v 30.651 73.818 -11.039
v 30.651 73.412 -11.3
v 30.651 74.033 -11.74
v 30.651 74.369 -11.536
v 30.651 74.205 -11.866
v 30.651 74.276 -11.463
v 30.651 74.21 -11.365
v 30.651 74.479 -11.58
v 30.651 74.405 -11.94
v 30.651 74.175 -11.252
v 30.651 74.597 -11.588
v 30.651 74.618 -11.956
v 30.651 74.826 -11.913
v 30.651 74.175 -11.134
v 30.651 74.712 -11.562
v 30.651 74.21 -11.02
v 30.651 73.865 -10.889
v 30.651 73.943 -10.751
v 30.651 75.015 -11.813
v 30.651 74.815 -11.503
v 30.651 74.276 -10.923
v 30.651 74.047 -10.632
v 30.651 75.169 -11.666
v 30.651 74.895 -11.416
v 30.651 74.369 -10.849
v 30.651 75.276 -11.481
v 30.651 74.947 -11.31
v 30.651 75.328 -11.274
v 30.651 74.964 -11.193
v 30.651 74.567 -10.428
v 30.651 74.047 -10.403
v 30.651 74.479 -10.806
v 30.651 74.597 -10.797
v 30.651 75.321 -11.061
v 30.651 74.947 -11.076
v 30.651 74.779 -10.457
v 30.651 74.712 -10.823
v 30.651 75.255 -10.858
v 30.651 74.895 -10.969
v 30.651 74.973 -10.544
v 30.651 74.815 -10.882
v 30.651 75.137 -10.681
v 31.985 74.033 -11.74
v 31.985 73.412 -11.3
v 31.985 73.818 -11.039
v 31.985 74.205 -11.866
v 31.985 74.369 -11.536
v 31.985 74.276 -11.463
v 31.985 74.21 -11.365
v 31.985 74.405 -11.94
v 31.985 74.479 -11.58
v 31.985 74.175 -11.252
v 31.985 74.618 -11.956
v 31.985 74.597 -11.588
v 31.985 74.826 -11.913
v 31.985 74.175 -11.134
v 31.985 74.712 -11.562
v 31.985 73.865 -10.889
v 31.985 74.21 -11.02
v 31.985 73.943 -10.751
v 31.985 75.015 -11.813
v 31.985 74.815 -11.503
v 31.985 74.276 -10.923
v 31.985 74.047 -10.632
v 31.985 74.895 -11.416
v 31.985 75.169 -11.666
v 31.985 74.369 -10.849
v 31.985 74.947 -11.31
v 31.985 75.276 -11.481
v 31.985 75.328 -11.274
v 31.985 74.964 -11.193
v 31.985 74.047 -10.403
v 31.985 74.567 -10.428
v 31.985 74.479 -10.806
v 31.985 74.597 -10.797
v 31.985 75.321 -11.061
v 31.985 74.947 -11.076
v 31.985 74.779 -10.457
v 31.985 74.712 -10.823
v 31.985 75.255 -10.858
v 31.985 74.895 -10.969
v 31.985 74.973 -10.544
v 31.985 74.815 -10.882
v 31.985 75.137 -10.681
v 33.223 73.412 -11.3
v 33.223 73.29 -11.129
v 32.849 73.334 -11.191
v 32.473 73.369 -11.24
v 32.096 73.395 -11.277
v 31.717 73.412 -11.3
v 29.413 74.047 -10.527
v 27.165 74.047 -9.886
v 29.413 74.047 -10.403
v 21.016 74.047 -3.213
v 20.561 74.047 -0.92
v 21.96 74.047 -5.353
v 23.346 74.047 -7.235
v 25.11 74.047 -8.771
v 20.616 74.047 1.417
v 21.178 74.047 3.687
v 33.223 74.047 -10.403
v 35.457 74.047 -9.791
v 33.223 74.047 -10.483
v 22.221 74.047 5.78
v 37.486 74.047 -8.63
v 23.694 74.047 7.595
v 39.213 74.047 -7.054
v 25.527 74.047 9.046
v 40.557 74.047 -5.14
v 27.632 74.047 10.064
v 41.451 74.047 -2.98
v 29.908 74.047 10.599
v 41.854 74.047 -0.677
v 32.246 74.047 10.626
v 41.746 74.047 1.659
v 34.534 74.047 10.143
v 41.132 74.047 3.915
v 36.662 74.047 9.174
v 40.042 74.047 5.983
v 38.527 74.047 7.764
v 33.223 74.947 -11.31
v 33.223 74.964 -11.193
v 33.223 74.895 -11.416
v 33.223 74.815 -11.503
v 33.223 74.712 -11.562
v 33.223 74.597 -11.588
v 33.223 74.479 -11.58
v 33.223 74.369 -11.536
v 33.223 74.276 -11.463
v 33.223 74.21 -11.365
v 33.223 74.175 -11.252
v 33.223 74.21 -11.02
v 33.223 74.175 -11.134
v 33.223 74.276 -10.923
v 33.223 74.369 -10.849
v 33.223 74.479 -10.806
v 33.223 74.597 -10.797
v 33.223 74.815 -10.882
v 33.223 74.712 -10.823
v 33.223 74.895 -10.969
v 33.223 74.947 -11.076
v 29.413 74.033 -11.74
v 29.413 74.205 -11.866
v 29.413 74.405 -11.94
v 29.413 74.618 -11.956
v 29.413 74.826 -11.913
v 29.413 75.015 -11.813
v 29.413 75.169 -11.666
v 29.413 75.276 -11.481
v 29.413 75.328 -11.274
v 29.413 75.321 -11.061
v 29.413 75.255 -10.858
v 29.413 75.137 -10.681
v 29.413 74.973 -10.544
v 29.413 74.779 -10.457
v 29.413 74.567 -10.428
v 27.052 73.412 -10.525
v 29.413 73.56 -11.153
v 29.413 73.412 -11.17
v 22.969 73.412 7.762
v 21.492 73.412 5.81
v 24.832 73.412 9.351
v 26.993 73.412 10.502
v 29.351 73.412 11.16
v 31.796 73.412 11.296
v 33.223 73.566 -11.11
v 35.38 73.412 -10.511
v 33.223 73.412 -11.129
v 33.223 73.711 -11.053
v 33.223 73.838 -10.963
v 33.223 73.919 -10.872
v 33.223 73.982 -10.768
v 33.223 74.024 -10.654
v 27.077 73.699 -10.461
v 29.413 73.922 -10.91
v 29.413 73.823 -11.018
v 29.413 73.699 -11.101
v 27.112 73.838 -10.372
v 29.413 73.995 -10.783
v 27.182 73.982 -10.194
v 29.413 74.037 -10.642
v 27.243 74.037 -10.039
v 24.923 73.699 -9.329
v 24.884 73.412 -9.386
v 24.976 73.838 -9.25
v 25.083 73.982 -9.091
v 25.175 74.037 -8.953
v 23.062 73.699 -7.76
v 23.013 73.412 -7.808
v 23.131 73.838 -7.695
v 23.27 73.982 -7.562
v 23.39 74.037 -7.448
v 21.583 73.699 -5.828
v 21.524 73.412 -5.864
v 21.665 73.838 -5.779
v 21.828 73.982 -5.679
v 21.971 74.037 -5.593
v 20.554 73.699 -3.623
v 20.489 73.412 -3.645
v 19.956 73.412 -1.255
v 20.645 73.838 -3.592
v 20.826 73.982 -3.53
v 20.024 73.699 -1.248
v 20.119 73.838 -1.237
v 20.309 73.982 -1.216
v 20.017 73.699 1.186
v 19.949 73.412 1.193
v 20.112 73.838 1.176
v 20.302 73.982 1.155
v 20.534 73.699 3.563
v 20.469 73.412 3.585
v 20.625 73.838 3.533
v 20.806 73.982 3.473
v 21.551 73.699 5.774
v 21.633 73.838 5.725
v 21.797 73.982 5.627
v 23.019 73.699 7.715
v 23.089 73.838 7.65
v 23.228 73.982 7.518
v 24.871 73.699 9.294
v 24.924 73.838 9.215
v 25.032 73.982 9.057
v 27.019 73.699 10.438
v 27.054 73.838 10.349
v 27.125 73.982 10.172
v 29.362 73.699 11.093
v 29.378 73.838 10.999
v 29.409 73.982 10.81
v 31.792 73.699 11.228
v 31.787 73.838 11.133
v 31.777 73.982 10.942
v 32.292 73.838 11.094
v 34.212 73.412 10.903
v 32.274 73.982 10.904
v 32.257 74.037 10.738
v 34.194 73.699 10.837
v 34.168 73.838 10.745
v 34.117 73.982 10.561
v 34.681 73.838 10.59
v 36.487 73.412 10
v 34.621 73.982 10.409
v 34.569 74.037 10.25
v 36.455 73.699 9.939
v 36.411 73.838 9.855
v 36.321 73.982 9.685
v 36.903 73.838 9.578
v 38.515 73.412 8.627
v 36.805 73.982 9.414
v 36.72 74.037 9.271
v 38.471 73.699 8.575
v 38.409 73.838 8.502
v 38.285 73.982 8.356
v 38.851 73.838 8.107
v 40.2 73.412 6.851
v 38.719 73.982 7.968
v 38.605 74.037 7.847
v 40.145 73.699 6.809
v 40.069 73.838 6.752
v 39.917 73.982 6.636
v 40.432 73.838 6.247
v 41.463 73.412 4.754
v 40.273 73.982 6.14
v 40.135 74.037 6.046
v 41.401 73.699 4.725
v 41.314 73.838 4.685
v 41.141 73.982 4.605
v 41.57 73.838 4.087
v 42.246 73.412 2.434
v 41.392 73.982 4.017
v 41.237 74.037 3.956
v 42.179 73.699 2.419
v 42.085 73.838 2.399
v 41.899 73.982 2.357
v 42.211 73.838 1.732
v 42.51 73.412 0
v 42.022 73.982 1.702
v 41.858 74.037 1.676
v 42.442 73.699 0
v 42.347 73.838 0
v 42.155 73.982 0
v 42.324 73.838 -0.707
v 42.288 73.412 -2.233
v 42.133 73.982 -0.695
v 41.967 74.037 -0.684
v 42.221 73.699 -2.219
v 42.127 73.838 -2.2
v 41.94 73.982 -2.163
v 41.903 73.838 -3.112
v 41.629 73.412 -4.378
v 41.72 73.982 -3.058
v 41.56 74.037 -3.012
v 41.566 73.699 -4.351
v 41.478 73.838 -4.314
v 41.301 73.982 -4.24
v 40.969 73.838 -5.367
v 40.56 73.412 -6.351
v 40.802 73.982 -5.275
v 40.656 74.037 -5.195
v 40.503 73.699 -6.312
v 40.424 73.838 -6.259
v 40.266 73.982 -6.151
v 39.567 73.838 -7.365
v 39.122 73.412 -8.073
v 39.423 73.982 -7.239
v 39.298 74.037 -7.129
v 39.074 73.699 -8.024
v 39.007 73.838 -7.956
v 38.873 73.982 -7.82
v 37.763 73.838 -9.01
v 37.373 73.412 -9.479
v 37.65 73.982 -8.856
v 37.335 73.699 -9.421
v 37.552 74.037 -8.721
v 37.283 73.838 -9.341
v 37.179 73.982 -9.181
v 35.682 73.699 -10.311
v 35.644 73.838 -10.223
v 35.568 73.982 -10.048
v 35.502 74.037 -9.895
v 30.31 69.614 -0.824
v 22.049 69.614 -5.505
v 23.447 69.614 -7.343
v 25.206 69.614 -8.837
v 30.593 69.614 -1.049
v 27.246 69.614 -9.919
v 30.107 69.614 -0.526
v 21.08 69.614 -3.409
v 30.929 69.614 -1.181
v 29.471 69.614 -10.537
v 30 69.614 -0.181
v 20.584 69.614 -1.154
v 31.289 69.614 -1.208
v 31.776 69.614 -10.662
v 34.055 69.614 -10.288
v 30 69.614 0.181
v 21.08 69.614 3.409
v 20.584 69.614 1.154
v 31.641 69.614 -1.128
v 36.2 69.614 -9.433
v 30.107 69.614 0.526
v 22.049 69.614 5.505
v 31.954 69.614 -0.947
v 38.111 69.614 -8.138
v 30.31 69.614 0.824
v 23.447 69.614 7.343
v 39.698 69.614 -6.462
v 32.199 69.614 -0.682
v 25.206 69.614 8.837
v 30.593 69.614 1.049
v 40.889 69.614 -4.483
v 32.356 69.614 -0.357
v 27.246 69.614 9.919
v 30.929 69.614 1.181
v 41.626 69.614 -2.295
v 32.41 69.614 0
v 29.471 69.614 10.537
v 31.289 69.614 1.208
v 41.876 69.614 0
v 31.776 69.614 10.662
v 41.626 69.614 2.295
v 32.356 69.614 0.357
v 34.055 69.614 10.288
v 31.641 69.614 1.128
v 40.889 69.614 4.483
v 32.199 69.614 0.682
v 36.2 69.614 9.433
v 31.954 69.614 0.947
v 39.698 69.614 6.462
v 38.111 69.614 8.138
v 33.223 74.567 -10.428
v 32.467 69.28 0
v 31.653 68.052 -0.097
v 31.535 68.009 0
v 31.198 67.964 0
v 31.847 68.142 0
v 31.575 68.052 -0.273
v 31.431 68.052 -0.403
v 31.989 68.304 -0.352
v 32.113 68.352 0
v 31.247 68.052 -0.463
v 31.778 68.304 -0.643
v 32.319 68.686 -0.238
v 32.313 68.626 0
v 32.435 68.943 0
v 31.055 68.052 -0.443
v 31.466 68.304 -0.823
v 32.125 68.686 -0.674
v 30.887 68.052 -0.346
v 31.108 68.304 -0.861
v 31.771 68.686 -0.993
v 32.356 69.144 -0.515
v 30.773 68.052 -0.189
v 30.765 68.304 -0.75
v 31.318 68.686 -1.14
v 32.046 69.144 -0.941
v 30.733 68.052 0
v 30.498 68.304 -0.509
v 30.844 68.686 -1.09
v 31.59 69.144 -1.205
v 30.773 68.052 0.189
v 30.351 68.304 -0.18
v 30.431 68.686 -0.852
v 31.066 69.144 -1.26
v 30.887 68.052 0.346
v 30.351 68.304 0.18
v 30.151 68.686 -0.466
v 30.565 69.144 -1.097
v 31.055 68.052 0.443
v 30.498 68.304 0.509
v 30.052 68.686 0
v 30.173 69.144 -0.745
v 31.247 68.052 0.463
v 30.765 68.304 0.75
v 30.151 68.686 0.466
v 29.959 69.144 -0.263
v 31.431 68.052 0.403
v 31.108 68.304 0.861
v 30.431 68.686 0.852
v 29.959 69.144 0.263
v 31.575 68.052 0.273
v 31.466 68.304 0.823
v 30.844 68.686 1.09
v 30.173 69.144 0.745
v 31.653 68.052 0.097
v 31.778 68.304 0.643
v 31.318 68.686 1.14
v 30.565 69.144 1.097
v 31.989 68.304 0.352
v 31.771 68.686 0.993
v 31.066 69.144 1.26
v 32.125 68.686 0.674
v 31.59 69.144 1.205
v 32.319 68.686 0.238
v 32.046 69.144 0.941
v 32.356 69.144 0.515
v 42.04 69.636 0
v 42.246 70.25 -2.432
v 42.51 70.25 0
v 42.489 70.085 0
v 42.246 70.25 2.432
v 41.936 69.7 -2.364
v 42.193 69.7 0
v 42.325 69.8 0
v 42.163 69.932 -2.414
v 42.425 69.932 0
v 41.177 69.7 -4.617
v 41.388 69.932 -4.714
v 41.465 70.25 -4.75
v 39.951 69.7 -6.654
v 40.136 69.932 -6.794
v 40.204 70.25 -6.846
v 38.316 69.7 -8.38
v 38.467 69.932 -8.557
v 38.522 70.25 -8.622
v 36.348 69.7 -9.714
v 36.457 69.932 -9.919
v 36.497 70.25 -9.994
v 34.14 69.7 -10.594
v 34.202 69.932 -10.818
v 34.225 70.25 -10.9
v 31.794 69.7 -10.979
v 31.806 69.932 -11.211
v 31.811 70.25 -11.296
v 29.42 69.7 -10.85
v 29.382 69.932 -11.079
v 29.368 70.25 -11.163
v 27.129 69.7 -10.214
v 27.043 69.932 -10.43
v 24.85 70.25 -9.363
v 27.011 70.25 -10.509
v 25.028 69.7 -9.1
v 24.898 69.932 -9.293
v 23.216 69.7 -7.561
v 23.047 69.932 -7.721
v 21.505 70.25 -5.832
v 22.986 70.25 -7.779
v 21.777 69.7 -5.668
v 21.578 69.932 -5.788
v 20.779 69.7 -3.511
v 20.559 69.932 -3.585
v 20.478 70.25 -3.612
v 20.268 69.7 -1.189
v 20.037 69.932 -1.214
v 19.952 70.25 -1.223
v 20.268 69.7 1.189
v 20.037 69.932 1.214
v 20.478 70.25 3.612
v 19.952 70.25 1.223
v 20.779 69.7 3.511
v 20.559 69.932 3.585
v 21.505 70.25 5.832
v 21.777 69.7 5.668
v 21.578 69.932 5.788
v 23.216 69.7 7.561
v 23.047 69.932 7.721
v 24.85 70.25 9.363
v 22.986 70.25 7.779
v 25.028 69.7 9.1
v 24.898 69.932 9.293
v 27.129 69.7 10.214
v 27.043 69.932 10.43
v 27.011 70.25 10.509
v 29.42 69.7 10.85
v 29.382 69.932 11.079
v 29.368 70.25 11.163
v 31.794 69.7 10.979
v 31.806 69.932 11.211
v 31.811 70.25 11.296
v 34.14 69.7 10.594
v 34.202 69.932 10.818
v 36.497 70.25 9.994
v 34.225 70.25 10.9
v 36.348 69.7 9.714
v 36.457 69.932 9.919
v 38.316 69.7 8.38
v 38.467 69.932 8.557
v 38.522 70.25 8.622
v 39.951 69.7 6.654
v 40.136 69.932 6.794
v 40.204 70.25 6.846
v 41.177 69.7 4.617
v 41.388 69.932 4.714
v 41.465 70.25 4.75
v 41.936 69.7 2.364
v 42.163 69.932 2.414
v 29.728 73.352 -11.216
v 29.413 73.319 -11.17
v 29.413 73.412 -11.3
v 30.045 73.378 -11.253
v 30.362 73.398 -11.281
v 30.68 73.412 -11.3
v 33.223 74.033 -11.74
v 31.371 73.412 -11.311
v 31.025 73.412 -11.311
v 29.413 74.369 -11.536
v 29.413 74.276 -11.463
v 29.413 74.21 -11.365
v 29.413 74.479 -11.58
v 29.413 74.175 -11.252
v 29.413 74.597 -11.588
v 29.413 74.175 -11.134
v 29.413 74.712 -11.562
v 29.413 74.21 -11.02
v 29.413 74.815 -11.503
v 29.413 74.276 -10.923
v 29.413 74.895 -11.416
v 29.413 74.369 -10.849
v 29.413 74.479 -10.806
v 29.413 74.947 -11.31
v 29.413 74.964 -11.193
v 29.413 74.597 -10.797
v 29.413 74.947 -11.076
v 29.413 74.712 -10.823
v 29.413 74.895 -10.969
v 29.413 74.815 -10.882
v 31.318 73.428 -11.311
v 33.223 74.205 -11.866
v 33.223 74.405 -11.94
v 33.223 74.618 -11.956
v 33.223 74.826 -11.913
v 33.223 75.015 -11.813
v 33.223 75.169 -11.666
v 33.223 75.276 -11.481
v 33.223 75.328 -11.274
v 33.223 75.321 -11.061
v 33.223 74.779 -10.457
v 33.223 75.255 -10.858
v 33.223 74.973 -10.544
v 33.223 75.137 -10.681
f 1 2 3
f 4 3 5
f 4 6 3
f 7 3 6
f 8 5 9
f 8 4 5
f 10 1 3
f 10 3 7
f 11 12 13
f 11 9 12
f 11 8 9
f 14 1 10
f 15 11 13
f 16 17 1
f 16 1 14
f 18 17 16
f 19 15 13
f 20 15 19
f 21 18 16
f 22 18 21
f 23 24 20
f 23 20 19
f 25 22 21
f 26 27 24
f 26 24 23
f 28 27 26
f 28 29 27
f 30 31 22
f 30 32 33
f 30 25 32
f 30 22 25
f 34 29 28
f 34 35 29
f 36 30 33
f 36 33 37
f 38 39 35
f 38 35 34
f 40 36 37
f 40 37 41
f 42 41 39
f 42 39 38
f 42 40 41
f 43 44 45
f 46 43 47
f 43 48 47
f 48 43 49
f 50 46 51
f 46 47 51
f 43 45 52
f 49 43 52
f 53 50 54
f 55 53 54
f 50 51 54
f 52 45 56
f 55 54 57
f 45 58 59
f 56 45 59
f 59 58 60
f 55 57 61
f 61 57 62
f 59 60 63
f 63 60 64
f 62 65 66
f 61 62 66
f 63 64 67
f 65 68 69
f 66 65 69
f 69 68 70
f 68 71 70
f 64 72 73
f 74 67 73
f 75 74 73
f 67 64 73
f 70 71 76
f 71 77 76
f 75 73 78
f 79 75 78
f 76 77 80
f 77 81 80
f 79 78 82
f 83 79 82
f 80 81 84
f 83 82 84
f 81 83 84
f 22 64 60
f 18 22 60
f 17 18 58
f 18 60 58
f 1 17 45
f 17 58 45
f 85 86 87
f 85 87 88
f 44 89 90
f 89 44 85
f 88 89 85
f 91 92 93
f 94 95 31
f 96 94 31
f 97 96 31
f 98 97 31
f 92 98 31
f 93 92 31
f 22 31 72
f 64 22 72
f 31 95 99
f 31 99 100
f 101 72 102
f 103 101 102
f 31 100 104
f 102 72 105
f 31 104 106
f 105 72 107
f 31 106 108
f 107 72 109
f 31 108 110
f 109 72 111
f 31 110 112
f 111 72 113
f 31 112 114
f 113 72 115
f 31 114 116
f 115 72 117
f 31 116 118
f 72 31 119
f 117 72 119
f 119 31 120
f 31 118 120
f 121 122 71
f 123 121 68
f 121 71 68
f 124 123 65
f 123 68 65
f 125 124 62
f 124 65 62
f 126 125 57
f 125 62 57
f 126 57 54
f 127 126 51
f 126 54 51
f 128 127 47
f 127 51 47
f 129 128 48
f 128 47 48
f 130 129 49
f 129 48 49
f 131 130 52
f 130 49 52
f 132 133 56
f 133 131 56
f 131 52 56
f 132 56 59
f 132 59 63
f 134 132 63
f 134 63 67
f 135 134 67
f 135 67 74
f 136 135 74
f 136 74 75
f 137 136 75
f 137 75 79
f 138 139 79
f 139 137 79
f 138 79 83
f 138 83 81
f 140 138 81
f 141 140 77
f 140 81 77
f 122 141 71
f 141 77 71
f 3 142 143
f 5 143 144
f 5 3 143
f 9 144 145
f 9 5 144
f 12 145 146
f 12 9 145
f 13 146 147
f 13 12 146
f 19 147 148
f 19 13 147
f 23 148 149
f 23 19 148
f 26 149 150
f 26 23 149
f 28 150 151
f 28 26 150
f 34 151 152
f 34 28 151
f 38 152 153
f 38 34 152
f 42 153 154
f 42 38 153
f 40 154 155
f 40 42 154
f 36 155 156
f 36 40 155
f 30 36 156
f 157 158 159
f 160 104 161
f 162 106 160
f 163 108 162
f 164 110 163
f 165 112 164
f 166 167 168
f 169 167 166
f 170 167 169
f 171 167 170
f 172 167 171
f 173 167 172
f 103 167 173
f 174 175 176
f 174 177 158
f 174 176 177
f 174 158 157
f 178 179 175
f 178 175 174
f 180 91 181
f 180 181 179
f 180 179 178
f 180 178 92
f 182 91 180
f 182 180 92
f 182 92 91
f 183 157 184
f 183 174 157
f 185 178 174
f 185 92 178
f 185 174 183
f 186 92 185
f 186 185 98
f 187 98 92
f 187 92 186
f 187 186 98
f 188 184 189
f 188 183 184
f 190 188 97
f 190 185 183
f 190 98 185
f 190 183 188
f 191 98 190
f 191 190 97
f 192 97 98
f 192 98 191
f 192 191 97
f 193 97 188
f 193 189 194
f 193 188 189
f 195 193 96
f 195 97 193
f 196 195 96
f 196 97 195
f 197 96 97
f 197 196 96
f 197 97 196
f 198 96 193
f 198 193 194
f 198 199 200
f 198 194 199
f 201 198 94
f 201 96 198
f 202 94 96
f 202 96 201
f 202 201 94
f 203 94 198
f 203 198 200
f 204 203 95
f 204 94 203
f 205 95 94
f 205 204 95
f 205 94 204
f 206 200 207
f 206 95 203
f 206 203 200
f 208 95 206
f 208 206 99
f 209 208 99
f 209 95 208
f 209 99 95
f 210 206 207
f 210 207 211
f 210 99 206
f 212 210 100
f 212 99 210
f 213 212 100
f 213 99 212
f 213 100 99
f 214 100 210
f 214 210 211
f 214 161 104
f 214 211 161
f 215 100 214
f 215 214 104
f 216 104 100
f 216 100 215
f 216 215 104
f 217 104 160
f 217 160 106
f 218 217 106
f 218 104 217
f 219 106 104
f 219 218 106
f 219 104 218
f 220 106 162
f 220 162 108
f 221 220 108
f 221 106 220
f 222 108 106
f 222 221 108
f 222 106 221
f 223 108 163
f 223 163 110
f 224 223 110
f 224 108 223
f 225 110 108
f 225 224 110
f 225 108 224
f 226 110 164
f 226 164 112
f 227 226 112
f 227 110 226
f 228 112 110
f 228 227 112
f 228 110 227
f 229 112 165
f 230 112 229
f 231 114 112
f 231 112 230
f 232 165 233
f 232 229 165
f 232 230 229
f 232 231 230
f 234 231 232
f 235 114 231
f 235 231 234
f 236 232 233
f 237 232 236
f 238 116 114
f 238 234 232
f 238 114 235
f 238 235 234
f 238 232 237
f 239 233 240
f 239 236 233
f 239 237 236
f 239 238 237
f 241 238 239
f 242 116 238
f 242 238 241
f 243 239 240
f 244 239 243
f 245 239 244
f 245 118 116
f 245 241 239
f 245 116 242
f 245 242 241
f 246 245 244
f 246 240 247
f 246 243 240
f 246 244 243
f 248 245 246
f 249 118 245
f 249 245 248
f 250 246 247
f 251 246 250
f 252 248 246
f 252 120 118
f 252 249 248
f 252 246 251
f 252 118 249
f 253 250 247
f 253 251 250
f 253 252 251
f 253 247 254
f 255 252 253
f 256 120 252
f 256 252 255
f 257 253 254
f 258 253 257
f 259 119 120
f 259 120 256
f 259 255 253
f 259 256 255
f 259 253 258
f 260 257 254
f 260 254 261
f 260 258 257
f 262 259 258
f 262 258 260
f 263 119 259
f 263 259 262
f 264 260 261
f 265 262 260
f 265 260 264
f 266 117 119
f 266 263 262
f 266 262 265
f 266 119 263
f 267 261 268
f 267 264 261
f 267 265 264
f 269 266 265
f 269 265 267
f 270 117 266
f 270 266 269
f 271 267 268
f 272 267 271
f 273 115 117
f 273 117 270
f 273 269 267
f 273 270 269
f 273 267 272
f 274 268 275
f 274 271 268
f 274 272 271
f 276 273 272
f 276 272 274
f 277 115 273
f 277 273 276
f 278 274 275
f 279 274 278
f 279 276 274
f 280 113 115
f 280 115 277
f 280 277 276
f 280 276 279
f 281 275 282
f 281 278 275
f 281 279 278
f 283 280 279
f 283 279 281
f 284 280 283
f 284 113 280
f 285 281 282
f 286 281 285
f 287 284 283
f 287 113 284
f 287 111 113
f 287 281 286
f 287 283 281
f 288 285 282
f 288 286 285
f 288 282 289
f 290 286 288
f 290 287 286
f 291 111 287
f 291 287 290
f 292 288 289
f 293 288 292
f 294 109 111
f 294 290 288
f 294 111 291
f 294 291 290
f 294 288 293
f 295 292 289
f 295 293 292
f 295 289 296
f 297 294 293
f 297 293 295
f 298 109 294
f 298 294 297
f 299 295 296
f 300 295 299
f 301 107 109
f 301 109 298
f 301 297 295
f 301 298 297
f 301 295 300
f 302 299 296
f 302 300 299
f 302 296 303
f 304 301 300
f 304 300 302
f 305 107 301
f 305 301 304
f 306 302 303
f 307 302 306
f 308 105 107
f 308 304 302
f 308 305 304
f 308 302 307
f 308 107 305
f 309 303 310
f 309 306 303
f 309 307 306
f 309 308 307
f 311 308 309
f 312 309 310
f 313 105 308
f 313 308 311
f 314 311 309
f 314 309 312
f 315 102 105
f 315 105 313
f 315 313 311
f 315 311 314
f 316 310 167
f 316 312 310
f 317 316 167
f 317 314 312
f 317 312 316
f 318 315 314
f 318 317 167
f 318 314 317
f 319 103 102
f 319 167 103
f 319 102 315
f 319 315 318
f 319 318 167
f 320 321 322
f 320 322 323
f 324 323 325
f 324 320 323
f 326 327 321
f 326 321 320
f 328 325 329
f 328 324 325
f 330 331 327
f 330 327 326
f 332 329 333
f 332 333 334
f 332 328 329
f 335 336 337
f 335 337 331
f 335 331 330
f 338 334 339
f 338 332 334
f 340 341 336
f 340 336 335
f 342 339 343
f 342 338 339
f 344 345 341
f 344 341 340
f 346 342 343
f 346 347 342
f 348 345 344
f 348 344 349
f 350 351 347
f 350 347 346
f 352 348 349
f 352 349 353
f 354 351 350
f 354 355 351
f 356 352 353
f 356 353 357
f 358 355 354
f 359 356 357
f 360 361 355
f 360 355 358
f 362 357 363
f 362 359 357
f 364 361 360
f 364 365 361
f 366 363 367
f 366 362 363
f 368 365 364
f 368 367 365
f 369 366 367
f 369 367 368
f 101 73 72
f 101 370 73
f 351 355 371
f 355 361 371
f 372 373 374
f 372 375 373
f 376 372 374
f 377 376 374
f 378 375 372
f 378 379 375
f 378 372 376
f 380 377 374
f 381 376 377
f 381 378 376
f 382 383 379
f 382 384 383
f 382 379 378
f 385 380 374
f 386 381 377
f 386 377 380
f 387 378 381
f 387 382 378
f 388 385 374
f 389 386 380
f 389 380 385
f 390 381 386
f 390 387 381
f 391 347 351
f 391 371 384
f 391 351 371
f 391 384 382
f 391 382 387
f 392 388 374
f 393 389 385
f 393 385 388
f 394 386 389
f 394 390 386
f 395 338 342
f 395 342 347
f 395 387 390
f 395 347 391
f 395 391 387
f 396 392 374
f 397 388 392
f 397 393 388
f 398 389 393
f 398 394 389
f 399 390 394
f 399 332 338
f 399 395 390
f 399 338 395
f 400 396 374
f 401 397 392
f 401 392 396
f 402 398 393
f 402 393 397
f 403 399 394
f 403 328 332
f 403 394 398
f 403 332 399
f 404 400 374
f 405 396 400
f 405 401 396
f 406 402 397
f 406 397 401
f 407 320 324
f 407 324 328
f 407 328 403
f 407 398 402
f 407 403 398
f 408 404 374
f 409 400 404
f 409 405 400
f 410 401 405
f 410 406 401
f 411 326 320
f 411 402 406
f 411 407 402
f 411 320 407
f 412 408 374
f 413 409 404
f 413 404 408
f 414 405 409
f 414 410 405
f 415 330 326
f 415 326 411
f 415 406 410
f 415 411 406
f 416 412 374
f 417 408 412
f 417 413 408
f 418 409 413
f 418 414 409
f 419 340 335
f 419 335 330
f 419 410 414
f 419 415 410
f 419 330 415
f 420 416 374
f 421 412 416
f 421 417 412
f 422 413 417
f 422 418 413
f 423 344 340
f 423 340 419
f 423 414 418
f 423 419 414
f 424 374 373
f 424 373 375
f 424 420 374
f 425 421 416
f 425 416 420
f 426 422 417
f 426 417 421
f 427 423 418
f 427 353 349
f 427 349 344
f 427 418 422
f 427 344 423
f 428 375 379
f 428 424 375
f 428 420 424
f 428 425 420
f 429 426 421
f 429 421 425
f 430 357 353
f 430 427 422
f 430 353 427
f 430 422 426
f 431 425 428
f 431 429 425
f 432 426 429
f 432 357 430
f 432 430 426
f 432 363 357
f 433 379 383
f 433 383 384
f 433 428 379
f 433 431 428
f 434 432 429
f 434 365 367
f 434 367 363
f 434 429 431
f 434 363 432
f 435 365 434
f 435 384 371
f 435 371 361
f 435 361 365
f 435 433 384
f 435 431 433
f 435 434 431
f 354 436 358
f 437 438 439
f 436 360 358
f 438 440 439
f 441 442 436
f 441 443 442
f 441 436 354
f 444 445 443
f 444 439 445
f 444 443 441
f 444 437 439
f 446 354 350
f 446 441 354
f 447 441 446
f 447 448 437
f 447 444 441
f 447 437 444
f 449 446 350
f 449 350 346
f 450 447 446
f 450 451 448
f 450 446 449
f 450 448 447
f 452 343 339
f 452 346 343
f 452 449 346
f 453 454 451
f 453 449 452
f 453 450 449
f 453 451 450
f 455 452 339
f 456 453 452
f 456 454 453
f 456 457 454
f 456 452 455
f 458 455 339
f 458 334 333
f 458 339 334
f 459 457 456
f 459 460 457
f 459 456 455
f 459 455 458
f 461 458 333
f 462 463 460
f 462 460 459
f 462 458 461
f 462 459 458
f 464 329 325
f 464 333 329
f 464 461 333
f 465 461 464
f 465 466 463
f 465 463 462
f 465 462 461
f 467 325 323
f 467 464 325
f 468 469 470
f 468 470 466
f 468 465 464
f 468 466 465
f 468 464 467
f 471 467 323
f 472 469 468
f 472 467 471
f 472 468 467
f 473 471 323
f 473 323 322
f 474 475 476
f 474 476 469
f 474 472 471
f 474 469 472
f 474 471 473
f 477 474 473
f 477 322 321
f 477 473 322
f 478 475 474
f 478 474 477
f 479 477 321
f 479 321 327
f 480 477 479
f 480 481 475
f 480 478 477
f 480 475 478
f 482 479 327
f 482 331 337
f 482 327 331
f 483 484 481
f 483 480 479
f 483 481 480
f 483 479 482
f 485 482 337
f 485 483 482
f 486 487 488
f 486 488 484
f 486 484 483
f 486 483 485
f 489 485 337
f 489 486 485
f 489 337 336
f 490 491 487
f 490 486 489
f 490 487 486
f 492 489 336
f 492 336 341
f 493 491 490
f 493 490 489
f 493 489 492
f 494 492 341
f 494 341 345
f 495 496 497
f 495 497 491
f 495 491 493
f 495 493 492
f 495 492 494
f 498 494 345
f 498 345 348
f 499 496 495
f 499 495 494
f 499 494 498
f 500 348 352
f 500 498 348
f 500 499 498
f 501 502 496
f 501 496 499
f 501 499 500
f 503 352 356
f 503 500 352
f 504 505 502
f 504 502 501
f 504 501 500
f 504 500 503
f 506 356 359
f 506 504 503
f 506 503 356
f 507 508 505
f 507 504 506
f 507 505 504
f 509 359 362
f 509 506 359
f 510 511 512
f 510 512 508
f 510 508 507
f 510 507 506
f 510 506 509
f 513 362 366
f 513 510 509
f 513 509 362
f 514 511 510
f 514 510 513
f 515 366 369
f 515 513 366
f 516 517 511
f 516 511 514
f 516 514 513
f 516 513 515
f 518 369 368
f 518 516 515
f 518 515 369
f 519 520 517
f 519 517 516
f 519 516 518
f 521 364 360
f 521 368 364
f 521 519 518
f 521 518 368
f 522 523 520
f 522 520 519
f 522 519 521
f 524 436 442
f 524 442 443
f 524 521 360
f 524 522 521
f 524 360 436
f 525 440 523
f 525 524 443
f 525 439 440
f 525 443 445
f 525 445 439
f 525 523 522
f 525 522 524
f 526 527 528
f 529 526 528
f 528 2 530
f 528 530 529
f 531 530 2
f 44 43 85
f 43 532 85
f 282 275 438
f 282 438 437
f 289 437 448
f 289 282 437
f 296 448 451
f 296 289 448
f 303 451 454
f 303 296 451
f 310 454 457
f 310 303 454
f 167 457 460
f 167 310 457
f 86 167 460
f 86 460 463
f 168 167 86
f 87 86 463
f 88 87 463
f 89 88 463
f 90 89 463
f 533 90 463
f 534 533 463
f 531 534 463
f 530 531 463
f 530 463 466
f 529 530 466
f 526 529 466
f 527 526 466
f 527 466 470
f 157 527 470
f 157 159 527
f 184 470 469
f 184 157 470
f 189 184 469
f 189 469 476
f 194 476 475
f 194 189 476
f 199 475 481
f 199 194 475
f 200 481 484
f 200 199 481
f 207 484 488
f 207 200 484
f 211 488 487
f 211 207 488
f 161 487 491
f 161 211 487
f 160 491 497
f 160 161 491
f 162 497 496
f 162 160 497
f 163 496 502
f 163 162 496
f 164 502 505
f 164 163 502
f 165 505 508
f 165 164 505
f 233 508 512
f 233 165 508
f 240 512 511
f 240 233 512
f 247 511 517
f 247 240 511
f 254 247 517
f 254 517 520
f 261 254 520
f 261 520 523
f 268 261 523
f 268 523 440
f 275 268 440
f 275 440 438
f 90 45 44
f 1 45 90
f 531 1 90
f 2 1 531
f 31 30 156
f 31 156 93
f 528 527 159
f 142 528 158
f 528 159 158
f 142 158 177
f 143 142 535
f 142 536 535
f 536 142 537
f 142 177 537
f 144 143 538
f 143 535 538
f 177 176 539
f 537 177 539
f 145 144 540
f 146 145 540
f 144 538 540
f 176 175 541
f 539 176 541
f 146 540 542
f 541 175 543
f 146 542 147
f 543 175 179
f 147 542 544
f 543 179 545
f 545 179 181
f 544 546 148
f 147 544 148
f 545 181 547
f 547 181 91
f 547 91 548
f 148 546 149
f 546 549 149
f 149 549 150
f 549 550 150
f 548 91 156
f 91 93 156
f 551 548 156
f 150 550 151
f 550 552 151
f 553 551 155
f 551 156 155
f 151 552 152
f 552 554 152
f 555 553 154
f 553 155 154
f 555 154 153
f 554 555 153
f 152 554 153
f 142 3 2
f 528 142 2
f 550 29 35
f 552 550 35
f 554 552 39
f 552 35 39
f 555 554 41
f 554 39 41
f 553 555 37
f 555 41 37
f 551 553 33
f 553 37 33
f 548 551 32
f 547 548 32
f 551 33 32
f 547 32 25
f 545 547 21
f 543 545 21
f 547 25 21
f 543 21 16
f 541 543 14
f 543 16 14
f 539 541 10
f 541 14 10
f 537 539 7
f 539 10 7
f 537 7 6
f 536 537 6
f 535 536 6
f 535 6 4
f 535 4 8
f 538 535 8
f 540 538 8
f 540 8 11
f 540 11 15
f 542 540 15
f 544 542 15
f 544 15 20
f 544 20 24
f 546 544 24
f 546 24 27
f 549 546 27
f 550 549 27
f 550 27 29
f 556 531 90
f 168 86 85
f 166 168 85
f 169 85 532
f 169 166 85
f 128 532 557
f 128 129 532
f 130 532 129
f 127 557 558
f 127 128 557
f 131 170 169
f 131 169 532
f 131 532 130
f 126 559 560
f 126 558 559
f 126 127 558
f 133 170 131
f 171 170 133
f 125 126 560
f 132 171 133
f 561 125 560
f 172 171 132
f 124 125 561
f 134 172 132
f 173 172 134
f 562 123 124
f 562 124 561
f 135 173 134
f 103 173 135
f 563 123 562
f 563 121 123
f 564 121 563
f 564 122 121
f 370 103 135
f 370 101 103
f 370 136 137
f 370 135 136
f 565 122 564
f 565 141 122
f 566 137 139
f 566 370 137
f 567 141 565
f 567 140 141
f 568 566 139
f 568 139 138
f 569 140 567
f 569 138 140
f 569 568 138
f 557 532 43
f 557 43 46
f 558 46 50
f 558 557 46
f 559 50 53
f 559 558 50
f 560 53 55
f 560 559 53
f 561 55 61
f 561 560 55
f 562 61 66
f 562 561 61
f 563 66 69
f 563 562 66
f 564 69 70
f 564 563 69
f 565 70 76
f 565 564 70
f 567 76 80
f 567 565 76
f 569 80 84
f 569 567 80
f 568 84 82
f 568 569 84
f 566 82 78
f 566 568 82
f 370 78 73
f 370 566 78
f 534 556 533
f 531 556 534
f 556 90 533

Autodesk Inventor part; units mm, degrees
ref_plane "XZ Plane" through (0, 0, 0) normal (0, 1, 0) x (-1, 0, 0)
ref_plane "XY Plane" through (0, 0, 0) normal (0, 0, 1) x (1, 0, 0)
sketch "Sketch1" plane through (0, 0, 0) normal (0, 0, 1) x (1, 0, 0)
  line L0 (8.9491, 93.5489) -> (53.3991, 93.5489) construction
  line L1 (53.3991, 93.5489) -> (53.3991, 10.9989) construction
  line L2 (53.3991, 10.9989) -> (8.9491, 10.9989) construction
  line L3 (8.9491, 10.9989) -> (8.9491, 93.5489) construction
  line L4 (42.5105, 69.6145) -> (42.5105, 74.0469)
  line L5 (31.1983, 74.0469) -> (31.1983, 69.6145)
  line L6 (31.1983, 74.0469) -> (42.5105, 74.0469)
  line L7 (42.5105, 69.6145) -> (31.1983, 69.6145)
  circle A0 centre (31.1983, 69.2335) radius 1.27
  line L8 (31.1983, 69.6145) -> (31.1983, 67.9635)
  point P0 (0, 0)
  point P1 (32.4098, 69.6145)
  dimension "d3" = 2.54
  dimension "d4" = 0.381
revolve "Revolution1" add sketch "Sketch1" angle 360 about axis through (31.1983, 74.0469, 0) along (0, -1, 0) contours L7 A0 L5 L6 L4 | A0 L8 L7 | L7 L5 A0
fillet "Fillet1" radius 0.635 2 edges at (19.8861, 74.0469, 0) (19.8861, 69.6145, 0)
ref_plane "Work Plane1" through (31.3182, 0, 0) normal (1, 0, 0) x (0, 1, 0)
sketch "Sketch3" plane through (31.3182, 0, 0) normal (1, 0, 0) x (0, 1, 0)
  line L0 (91.7474, 13.6776) -> (91.7474, -13.6861) construction
  line L1 (91.7474, -13.6861) -> (69.2257, -13.6861) construction
  line L2 (69.2257, -13.6861) -> (69.2257, 13.6776) construction
  line L3 (69.2257, 13.6776) -> (91.7474, 13.6776) construction
  circle A0 centre (74.5674, -11.1927) radius 0.765
  circle A1 centre (74.5674, -11.1927) radius 0.3969
  line L4 (74.033, -11.7401) -> (73.4119, -11.3003)
  line L5 (73.4119, -11.3122) -> (73.4119, 11.3122) projected
  line L6 (74.5674, -10.4276) -> (74.0469, -10.4034)
  line L7 (74.0469, 10.6772) -> (74.0469, -10.6772) projected
  line L8 (73.818, -11.0391) -> (73.4119, -11.3003)
  line L9 (74.0727, -10.4046) -> (72.7289, -10.3422)
  line L10 (72.7289, -10.3422) -> (73.4119, -11.3003)
  point P0 (0, 0)
  point P1 (74.0469, -10.632)
  dimension "d49" = 1.53
  dimension "d50" = 0.7937
extrude "Extrusion1" add sketch "Sketch3" along normal mid plane 3.81 contours A0
extrude "Extrusion2" cut sketch "Sketch3" along normal mid plane 1.3335 contours A0 | A1
extrude "Extrusion3" add sketch "Sketch3" along normal mid plane 3.81 contours A0 L7 L6 | L4 L8 A0 | A0 L8 L5 L9 L7 | L10 L9 L5
extrude "Extrusion4" cut sketch "Sketch3" along normal mid plane 1.3335 contours A0 L7 L6 | L4 L8 A0
properties part number "Neck_3DPrint"
